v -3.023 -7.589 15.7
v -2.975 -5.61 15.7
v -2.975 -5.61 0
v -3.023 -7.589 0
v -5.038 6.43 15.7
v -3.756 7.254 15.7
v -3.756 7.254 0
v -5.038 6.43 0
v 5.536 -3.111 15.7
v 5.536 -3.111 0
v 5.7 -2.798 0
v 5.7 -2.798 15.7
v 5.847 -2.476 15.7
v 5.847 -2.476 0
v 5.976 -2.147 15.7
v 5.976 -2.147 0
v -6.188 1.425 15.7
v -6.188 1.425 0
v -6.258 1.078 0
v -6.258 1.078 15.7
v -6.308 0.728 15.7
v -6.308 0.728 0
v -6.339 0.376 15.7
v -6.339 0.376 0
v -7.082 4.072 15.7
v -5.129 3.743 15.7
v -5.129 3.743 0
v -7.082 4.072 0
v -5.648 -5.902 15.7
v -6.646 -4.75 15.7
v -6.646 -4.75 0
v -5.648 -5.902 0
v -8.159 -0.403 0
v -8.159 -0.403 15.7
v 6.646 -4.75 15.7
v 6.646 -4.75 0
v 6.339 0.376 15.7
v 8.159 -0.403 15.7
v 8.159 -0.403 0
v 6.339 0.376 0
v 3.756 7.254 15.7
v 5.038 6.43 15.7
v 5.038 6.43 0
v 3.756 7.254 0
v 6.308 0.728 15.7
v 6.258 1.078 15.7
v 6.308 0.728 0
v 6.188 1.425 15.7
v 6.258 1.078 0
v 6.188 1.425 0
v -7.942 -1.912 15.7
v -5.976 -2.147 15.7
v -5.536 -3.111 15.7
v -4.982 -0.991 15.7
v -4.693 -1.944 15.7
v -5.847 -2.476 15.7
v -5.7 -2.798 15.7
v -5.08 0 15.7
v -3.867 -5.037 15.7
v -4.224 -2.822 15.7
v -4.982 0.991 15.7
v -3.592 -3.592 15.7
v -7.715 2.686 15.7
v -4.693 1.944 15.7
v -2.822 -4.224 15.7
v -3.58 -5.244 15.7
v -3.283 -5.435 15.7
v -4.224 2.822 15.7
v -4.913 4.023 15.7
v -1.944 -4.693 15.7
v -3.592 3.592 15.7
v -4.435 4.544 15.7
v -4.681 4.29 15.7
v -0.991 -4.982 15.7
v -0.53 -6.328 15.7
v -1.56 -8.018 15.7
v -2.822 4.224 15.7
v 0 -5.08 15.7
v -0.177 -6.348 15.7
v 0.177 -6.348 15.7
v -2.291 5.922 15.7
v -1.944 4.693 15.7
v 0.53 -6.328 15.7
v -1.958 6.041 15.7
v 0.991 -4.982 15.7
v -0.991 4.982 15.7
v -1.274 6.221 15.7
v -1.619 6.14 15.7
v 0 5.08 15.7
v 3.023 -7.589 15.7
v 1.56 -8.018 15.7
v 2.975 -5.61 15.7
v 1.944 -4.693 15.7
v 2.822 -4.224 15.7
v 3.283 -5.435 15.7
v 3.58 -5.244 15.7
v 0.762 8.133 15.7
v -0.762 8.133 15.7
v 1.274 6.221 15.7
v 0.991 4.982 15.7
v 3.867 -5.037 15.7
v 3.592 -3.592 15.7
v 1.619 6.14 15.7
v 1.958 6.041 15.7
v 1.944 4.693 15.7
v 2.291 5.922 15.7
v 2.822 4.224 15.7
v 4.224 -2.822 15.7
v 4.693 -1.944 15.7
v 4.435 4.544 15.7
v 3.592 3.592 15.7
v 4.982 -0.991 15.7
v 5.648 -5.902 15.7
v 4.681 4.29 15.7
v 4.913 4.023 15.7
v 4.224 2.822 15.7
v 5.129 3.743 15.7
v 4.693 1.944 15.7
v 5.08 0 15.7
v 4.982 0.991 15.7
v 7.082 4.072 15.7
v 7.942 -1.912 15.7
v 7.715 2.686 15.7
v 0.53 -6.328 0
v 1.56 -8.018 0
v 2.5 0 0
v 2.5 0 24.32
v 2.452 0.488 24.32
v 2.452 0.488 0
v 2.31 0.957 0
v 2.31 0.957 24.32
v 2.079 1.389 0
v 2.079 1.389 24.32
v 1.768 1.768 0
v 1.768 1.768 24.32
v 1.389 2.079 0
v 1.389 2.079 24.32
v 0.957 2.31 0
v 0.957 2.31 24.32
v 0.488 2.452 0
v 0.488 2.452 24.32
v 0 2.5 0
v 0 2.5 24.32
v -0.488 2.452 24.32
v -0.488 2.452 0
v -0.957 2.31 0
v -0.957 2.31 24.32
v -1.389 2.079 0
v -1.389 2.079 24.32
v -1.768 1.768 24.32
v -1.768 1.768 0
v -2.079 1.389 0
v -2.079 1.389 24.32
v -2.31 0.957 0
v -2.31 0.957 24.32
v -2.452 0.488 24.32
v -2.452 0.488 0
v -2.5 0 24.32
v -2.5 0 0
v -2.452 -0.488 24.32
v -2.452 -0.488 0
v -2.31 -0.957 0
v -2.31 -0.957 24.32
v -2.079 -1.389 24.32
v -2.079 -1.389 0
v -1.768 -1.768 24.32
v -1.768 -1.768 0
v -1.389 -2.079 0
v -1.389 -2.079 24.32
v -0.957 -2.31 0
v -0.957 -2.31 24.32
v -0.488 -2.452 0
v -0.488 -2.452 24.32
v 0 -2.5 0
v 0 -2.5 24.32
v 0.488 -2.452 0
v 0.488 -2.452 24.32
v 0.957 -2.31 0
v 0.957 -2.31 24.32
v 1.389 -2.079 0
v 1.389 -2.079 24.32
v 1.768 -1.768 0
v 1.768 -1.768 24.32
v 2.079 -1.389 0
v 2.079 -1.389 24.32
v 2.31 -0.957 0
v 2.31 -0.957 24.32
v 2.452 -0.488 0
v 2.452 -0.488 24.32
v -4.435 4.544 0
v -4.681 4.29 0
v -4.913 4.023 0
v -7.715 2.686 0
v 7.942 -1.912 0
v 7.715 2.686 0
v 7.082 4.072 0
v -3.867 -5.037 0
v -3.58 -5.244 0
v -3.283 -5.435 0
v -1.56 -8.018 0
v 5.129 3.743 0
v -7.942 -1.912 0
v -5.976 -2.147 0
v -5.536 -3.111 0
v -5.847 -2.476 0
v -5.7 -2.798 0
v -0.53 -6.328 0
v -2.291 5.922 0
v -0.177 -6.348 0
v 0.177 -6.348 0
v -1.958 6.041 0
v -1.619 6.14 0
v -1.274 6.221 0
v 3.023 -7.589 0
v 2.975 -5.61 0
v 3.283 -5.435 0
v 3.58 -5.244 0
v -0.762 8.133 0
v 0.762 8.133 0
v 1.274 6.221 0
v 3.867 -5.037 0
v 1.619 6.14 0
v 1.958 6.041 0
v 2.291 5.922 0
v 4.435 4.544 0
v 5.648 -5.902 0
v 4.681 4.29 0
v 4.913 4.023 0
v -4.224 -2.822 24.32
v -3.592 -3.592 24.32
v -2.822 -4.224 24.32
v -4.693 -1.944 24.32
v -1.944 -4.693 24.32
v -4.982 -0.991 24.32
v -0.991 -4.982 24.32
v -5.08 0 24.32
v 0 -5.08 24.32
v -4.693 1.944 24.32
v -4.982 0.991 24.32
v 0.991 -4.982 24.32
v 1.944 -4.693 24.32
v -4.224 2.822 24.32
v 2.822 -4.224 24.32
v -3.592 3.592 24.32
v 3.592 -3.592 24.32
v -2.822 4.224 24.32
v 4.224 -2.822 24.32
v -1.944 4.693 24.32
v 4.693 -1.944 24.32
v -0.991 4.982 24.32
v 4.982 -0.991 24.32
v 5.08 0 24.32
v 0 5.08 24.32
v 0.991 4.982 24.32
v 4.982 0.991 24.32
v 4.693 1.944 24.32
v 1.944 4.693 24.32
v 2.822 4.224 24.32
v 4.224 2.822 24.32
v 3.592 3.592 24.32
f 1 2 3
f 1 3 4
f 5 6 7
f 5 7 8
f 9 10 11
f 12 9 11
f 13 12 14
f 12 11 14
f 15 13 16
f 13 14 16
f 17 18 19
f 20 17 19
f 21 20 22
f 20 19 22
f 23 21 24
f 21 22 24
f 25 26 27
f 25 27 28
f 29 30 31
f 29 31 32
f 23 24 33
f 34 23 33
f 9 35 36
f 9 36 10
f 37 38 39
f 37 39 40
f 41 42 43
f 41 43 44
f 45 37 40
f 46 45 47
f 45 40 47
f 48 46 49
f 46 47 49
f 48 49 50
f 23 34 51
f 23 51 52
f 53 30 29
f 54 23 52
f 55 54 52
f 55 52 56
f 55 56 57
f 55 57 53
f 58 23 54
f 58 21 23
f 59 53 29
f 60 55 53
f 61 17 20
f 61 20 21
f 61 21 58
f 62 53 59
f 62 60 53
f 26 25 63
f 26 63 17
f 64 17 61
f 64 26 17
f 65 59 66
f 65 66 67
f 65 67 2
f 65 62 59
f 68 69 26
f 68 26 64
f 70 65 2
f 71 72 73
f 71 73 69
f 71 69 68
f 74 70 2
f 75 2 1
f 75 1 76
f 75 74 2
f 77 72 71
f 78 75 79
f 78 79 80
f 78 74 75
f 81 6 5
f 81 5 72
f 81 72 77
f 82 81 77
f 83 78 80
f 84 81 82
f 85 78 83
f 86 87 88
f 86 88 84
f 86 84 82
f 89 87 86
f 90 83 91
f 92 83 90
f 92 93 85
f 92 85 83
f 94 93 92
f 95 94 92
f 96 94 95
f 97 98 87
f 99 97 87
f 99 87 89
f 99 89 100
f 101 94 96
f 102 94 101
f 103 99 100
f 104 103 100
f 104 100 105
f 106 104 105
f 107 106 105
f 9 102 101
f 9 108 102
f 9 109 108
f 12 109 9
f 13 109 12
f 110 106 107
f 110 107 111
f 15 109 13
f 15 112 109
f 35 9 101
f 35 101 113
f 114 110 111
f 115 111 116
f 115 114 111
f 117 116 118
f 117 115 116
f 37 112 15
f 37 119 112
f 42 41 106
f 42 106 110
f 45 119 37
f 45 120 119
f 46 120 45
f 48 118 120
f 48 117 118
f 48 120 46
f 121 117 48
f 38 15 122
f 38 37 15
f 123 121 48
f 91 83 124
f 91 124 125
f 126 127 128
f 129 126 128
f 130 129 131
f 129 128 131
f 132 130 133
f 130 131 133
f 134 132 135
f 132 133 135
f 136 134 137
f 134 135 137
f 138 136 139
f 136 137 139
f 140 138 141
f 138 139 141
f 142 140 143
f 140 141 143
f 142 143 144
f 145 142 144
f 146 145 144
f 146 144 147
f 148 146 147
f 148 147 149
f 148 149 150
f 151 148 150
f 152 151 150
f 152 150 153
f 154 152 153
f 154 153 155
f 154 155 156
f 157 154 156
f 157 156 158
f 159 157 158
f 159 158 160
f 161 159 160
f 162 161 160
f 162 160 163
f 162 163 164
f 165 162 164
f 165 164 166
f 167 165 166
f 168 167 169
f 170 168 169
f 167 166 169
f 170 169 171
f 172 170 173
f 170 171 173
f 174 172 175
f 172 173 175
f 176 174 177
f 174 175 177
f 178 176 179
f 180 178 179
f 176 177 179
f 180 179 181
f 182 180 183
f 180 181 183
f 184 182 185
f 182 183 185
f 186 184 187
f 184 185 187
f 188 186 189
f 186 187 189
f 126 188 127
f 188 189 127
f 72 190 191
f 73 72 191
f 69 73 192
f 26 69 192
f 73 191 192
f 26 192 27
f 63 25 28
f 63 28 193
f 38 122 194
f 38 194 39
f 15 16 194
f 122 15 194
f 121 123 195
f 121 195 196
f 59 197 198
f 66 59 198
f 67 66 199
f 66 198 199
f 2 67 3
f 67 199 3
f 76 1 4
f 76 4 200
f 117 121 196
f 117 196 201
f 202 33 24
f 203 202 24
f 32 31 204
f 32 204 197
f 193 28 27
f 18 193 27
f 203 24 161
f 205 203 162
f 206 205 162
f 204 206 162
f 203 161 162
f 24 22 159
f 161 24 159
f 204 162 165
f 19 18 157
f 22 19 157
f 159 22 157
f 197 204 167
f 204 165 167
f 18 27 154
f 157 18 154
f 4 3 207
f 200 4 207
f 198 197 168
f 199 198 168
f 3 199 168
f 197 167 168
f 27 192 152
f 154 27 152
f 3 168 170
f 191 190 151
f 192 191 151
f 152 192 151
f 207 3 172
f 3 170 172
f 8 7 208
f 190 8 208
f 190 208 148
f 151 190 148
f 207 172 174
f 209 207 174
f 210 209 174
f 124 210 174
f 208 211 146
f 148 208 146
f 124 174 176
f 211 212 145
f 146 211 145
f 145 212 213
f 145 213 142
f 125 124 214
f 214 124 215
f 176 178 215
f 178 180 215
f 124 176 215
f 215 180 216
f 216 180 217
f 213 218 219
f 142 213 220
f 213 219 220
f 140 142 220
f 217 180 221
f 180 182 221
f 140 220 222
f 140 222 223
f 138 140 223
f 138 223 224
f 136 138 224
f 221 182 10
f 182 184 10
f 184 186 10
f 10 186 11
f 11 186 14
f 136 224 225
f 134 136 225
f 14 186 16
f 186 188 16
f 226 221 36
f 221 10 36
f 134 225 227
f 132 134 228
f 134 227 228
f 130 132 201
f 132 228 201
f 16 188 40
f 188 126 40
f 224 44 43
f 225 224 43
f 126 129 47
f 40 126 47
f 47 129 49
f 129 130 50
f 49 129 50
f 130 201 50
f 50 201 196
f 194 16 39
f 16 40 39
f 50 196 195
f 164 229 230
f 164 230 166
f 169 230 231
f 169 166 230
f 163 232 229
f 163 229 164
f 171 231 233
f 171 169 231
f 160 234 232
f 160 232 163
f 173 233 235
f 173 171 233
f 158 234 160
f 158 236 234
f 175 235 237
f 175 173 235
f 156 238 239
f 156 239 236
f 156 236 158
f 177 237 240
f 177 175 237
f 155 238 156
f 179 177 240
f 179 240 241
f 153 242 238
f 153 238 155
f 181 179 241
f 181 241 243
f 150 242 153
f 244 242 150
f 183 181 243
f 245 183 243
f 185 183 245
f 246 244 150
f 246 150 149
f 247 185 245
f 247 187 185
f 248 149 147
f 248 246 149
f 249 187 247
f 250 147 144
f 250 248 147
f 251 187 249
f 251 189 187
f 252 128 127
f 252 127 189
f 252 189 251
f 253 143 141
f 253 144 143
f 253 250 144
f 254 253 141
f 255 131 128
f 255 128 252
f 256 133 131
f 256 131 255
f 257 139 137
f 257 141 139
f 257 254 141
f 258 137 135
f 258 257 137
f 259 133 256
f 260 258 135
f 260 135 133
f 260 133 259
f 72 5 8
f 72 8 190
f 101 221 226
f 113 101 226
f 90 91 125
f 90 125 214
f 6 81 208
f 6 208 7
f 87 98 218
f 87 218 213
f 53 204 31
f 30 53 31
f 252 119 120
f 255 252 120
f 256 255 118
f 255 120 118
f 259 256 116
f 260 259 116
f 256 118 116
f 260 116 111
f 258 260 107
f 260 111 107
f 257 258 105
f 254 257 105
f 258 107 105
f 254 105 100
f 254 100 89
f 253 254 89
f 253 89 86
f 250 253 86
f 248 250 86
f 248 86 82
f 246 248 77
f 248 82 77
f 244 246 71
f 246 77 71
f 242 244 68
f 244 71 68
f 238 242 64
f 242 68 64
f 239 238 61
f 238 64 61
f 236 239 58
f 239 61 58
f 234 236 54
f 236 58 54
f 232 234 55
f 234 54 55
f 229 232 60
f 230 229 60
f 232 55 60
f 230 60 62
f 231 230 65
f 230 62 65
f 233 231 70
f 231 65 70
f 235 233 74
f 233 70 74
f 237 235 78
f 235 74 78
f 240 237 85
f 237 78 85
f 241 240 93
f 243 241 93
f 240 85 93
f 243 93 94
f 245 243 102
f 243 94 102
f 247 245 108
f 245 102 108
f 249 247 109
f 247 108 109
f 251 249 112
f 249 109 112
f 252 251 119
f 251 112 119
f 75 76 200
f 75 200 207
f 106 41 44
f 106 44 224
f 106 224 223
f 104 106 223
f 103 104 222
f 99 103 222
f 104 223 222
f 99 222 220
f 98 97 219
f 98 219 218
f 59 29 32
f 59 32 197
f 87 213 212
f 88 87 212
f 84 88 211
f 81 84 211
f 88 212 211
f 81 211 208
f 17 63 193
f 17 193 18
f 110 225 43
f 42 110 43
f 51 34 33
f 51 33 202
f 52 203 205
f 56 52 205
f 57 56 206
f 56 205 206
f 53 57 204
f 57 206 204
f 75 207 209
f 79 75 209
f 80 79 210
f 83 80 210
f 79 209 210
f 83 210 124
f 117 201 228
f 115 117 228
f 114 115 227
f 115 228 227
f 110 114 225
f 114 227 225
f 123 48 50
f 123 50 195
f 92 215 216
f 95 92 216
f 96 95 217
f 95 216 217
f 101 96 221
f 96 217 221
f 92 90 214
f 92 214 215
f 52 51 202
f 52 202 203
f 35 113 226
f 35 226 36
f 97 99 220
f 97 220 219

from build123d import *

# Parameters (mm, degrees)
SKETCH1_R           = 6.35
BOSS_EXTRUDE1_DEPTH = 15.7
BOSS_EXTRUDE2_DEPTH = 15.7
CIRPATTERN1_COUNT   = 11
SKETCH3_R           = 5.08
BOSS_EXTRUDE3_DEPTH = 8.62
SKETCH4_R           = 2.5
CUT_EXTRUDE1_DEPTH  = 25.32


with BuildPart() as part:
    # Sketch1 → Boss-Extrude1 (new body)
    with BuildSketch(Plane.XY):
        Circle(SKETCH1_R)
    extrude(amount=BOSS_EXTRUDE1_DEPTH)

    # Sketch2 → Boss-Extrude2 (add)
    with BuildSketch(Plane.XY.offset(15.7)):
        Polygon((0, 8.13319935), (-0.762, 8.13319935), (-1.388433627, 5.795317226), (1.388433627, 5.795317226), (0.762, 8.13319935), align=None)
    boss_extrude2 = extrude(amount=-BOSS_EXTRUDE2_DEPTH)

    # CirPattern1: Boss-Extrude2 ×11 about axis
    cirpattern1_axis = Axis((0, 0, 0), (0, 0, 1))
    for i in range(1, CIRPATTERN1_COUNT):
        add(boss_extrude2.rotate(cirpattern1_axis, i * 360 / CIRPATTERN1_COUNT))

    # Sketch3 → Boss-Extrude3 (add)
    with BuildSketch(Plane.XY.offset(15.7)):
        Circle(SKETCH3_R)
    extrude(amount=BOSS_EXTRUDE3_DEPTH)

    # Sketch4 → Cut-Extrude1 (cut, through all)
    with BuildSketch(Plane.XY.offset(24.32)):
        Circle(SKETCH4_R)
    extrude(amount=-CUT_EXTRUDE1_DEPTH, mode=Mode.SUBTRACT)


solid = part.part
